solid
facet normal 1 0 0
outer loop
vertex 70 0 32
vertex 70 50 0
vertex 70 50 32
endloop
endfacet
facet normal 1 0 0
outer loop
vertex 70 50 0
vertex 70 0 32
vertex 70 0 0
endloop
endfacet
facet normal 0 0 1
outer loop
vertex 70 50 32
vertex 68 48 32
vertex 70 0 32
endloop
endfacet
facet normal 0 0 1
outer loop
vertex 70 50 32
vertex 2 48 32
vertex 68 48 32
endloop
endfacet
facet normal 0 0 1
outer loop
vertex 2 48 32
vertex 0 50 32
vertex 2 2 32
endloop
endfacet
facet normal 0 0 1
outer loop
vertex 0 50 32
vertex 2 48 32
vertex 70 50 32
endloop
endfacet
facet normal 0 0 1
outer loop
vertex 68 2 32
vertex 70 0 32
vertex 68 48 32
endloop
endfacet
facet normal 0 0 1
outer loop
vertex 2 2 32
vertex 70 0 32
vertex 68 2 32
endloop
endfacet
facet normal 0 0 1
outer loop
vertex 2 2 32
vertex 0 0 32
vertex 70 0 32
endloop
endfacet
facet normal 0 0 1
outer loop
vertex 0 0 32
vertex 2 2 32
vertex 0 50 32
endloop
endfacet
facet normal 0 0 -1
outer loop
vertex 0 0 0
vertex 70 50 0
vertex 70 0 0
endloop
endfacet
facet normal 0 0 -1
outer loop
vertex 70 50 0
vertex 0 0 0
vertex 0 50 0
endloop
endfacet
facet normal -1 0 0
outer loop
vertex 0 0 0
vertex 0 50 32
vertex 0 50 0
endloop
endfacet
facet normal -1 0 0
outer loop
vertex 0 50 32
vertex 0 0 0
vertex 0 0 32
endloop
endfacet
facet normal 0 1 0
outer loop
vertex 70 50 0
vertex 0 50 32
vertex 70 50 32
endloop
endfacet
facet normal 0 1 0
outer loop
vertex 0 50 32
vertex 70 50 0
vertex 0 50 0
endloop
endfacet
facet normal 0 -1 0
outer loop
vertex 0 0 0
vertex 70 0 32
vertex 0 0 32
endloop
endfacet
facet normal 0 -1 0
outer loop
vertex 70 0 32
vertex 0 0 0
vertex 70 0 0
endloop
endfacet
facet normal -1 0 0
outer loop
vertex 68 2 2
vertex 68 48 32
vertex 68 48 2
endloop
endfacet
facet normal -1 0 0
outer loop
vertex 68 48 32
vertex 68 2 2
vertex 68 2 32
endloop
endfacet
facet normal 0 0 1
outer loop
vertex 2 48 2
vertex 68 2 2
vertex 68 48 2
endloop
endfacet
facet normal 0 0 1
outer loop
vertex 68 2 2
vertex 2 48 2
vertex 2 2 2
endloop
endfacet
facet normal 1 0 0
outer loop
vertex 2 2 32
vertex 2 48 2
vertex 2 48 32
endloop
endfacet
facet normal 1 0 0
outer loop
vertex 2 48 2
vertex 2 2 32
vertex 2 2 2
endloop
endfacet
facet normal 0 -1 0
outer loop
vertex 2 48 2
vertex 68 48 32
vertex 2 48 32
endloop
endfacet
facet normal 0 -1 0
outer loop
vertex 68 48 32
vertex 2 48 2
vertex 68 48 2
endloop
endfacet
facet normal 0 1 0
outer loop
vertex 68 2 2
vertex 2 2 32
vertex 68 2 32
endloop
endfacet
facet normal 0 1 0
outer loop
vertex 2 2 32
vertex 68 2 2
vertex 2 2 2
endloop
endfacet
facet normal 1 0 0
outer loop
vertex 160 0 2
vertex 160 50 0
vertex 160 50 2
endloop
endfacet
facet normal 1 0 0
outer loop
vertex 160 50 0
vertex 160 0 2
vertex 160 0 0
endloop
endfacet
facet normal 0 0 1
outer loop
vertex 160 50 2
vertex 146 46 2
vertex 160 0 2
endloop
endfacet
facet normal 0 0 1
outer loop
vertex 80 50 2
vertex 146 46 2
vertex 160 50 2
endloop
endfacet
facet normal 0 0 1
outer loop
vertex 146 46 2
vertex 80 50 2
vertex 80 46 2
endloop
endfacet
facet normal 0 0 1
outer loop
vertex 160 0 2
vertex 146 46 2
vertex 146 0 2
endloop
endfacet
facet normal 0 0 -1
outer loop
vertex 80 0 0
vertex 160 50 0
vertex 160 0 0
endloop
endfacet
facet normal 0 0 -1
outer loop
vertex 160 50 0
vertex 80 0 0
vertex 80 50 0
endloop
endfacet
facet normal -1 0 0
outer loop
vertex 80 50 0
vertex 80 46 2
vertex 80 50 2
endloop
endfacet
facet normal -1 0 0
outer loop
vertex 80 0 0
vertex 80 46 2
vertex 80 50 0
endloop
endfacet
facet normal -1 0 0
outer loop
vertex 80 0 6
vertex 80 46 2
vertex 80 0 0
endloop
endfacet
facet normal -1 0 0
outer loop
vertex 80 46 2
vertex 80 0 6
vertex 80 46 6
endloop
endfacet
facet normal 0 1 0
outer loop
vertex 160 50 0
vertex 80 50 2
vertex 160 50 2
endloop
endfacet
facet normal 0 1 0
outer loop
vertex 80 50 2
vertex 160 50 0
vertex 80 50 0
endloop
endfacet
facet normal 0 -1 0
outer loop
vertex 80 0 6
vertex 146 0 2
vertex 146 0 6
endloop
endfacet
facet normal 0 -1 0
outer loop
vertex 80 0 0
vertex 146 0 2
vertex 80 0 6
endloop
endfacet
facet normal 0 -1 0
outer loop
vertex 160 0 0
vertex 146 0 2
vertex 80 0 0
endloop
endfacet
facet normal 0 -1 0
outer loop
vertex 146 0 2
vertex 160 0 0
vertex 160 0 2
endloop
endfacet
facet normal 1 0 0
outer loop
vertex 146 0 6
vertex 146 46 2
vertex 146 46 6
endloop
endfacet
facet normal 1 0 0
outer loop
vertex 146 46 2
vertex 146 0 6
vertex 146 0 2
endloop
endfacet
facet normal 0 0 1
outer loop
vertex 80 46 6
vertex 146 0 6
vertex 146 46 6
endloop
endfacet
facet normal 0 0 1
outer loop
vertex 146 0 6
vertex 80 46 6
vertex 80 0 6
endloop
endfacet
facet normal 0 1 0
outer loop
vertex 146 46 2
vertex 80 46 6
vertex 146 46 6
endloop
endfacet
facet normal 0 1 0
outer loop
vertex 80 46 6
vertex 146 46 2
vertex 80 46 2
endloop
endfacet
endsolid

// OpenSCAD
// Two-part enclosure for small electronics board (e.g. Arduino-based temperature logger)
// Prints together in one job: box on left, upside-down lid on right, with a gap.
// Units: mm. No external libraries.

// ---------------- Parameters ----------------
box_x      = 70;    // box outer length (X)
box_y      = 50;    // box outer width (Y)
box_z      = 30;    // box height (Z)
wall       = 2;     // box wall thickness
floor      = 2;     // box floor thickness
eps        = 0.5;   // cutter overshoot past faces

lip_t      = 1.5;   // lid lip wall thickness
lip_h      = 4;     // lid lip height
lip_x      = 65.6;  // lid lip outer length (X)
lip_y      = 45.6;  // lid lip outer width (Y)
clearance  = 0.2;   // side clearance between lip and box opening

gap        = 10;    // horizontal gap between box and lid
$fn        = 64;    // curve resolution

// Derived
box_in_x   = box_x - 2 * wall;   // box inner length
box_in_y   = box_y - 2 * wall;   // box inner width
lip_x2     = lip_x + 2 * clearance;  // lip outer size with clearance
lip_y2     = lip_y + 2 * clearance;

// ---------------- Model ----------------
union() {
    // Part 1: open-top box, centred in X/Y, resting on z = 0
    difference() {
        cube([box_x, box_y, box_z + floor]);
        translate([wall, wall, floor])
            cube([box_in_x, box_in_y, box_z + 1]);  // open top, extra height for clean cut
    }

    // Part 2: lid plate with a central lip, printed upside down
    translate([box_x + gap, 0, 0])
        union() {
            // Base plate
            cube([box_x + gap, box_y, 2]);
            // Central lip (wall 1.5 mm thick, 4 mm tall)
            translate([0, 0, 2])
                cube([lip_x2, lip_y2, lip_h]);
        }
}
